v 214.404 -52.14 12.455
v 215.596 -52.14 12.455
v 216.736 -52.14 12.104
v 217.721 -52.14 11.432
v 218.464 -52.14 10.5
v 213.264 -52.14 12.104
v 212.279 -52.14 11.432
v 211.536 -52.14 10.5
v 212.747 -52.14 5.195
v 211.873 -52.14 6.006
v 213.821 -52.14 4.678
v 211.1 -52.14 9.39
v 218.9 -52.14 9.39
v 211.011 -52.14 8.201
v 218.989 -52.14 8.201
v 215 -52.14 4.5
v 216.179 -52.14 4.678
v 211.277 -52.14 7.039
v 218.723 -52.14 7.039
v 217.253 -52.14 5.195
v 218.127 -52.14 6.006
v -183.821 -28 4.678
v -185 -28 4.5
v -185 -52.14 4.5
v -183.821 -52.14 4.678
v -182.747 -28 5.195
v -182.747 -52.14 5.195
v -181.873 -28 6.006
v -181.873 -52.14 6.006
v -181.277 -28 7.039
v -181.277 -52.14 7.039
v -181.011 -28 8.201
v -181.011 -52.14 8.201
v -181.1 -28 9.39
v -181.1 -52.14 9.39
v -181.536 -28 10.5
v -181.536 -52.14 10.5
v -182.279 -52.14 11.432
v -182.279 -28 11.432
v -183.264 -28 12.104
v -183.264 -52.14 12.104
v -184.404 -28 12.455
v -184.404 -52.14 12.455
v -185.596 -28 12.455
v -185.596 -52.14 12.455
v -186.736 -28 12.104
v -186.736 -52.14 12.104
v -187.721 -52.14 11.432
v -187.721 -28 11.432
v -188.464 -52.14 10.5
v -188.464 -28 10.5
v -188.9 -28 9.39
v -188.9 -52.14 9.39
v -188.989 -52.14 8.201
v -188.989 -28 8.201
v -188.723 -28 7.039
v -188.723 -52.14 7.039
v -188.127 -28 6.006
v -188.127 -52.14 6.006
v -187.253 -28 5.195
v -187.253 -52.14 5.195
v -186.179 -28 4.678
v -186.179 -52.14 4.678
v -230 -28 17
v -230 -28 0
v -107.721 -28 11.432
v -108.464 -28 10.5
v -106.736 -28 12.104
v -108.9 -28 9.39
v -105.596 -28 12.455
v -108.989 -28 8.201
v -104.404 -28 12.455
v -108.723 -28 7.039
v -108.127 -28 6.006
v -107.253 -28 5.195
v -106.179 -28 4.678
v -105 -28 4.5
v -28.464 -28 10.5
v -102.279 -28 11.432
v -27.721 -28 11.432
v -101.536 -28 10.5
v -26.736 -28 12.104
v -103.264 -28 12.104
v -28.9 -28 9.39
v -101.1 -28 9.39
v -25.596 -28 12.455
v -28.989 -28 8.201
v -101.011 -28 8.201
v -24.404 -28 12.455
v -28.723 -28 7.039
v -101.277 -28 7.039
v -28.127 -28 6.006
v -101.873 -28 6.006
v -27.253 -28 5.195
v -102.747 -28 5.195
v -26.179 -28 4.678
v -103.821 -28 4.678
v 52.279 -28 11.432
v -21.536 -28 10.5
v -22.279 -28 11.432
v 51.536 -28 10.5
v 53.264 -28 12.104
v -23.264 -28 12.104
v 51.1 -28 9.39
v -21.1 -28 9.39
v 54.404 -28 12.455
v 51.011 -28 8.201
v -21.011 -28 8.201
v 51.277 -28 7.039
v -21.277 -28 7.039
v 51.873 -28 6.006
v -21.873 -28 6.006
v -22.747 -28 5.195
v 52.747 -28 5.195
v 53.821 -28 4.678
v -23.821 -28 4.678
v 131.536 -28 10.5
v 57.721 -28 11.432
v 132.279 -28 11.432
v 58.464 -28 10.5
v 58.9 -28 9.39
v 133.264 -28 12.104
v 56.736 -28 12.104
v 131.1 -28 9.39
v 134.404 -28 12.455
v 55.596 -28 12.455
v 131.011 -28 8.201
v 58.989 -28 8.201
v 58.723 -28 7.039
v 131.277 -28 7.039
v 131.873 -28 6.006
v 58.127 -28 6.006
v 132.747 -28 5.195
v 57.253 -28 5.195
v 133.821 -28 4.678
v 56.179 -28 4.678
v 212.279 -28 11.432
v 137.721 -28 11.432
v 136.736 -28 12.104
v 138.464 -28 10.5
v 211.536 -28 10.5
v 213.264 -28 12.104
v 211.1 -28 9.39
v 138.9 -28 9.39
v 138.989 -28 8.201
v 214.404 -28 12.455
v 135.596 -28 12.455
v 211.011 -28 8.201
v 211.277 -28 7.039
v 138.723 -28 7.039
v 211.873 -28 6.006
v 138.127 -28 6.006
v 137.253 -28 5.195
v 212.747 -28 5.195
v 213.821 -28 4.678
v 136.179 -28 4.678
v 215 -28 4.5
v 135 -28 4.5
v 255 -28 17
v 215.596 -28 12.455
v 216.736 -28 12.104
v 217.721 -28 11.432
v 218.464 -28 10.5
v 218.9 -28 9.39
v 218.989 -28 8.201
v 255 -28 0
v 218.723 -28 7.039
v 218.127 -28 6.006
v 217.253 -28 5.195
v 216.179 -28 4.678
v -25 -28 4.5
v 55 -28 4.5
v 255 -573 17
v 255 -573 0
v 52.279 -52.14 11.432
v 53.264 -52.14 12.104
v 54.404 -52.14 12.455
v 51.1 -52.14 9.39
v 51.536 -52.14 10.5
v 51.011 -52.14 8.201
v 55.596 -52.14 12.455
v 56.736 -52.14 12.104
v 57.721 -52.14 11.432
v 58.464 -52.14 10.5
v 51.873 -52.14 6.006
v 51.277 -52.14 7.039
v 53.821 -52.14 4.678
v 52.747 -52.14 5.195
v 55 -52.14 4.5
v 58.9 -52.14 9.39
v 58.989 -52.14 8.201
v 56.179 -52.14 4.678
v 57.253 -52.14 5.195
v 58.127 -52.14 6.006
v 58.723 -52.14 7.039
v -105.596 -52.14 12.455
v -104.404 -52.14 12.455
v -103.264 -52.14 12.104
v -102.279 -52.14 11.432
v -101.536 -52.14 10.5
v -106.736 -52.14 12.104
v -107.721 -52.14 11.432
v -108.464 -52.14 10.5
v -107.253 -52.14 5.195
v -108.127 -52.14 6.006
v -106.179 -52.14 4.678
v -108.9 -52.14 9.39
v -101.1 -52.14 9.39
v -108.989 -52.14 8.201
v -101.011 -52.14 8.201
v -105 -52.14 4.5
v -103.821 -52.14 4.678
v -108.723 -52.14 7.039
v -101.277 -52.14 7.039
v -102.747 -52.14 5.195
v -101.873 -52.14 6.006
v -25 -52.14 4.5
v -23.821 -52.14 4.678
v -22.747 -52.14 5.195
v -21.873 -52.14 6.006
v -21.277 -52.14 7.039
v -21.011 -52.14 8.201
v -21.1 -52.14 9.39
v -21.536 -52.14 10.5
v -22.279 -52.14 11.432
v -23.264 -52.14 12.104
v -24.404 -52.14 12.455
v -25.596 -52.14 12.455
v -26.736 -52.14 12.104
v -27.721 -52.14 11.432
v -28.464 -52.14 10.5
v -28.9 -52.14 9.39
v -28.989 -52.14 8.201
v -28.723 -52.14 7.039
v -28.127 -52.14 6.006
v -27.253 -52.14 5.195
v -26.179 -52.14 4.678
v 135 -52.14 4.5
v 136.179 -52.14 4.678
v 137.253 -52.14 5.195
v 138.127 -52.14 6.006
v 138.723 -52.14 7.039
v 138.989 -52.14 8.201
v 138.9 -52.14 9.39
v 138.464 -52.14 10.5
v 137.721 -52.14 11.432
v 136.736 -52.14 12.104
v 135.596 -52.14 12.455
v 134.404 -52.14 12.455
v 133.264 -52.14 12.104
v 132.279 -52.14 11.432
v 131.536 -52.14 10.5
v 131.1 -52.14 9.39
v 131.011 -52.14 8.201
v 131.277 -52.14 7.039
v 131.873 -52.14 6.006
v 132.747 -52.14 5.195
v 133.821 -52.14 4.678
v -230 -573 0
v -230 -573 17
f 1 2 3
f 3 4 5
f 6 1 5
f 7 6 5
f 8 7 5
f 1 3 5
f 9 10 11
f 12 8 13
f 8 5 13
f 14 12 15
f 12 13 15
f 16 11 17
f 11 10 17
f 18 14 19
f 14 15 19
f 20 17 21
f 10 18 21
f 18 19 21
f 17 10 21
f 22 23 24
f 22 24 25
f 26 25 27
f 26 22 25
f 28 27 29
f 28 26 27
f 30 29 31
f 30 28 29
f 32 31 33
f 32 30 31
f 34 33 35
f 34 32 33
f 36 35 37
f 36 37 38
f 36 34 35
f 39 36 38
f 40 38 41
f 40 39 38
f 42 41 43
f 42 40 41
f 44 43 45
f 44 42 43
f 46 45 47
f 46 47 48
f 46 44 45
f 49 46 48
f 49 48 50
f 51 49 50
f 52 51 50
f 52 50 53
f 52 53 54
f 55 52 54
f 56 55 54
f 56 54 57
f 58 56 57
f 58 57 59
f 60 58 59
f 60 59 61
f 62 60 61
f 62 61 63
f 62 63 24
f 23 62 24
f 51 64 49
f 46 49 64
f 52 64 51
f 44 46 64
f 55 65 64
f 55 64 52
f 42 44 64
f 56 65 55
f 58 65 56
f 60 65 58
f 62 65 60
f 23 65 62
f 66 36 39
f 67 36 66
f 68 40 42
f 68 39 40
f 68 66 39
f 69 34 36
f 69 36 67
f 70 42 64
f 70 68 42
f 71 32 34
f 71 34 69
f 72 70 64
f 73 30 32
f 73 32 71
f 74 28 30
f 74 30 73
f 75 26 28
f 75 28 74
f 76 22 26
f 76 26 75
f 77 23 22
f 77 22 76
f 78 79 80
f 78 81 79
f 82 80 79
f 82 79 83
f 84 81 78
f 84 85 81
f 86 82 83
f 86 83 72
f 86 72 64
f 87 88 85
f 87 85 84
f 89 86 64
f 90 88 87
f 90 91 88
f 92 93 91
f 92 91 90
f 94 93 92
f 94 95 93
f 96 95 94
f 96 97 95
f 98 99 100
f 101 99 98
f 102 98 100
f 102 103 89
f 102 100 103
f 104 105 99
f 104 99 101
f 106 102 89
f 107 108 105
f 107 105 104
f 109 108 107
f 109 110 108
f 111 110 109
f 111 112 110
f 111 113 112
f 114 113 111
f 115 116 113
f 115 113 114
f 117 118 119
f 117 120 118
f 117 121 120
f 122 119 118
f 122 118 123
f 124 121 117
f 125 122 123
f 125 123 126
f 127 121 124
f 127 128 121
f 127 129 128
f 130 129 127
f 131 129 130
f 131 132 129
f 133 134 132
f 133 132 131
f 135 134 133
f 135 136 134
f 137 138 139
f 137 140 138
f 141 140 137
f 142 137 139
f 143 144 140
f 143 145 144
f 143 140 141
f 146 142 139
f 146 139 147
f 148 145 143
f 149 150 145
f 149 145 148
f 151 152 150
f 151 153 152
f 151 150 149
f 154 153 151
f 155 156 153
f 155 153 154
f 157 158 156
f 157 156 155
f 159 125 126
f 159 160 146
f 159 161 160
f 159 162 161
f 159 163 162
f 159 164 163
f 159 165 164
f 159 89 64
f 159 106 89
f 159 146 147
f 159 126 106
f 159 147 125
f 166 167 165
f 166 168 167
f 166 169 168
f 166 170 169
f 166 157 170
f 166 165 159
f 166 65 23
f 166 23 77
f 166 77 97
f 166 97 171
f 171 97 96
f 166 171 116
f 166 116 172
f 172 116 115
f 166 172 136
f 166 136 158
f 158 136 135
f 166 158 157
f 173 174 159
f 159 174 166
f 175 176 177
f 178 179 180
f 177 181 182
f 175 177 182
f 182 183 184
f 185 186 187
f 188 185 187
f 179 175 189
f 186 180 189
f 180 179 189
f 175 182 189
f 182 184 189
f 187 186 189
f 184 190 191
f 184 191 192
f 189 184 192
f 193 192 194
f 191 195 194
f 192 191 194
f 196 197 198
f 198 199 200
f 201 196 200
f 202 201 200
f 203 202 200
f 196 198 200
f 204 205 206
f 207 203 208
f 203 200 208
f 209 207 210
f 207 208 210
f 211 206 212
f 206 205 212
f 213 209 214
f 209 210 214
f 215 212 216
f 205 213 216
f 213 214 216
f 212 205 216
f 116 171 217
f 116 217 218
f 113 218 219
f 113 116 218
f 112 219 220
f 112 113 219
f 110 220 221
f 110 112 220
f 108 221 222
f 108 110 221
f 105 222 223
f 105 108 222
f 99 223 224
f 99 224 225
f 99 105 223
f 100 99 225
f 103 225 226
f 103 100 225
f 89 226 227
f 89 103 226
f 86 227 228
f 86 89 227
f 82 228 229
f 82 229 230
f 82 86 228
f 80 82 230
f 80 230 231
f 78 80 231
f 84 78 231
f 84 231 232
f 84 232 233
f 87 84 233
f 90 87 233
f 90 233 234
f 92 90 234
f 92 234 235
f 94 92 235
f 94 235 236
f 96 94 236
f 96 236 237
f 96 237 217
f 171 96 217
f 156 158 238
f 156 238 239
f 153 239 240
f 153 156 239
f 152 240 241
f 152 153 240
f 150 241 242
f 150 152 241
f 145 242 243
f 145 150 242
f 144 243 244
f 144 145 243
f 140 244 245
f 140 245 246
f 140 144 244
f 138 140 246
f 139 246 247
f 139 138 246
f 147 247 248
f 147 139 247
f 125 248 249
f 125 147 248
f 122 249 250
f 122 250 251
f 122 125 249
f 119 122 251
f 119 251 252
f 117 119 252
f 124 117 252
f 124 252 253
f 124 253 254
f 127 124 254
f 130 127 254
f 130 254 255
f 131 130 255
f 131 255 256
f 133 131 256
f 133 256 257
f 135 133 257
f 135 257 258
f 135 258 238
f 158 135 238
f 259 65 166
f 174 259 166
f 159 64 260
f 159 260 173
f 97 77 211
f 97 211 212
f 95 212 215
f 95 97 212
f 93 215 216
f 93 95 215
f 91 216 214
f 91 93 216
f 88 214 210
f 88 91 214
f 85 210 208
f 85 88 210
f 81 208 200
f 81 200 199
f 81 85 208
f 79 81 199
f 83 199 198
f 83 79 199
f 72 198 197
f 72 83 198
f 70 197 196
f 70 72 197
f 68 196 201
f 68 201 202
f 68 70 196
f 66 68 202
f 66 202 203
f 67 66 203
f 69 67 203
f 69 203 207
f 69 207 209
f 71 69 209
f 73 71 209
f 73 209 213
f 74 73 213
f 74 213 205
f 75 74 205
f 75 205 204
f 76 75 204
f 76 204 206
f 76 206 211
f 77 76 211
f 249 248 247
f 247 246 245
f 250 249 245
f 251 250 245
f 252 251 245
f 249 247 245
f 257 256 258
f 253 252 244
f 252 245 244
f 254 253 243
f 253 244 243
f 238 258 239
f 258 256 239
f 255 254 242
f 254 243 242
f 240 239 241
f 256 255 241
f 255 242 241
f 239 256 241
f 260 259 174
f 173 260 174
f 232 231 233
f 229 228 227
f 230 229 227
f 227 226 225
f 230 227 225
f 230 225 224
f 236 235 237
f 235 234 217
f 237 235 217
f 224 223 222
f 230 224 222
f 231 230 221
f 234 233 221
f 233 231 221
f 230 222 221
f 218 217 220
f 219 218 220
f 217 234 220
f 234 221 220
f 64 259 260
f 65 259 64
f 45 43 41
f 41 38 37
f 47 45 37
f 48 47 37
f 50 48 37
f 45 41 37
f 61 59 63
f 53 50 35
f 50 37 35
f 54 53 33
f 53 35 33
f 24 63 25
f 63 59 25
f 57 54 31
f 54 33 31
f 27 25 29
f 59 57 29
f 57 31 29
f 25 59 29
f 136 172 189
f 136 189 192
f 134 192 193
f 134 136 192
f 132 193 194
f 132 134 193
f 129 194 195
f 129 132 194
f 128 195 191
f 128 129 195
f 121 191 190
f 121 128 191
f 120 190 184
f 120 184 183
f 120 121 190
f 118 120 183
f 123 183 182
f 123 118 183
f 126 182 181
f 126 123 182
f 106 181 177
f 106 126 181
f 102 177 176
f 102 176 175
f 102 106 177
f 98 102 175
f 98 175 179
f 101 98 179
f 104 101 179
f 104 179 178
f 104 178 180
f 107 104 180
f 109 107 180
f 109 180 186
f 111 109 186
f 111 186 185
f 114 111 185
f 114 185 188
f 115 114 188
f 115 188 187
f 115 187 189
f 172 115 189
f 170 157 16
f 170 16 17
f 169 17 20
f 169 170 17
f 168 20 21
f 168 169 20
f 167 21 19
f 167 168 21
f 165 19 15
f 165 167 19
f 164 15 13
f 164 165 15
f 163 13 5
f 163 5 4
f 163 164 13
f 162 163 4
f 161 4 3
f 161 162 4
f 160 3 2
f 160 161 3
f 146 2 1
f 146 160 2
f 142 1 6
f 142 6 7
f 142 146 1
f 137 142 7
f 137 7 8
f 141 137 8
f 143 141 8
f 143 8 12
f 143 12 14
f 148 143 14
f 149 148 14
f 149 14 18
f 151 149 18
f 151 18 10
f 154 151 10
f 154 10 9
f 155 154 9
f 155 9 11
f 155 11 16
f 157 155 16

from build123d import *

# Parameters (mm, degrees)
SKETCH1_W               = 485
SKETCH1_H               = 545
BOSS_EXTRUDE1_DEPTH     = 17
CUT_EXTRUDE3_DEPTH      = 25
CUT_EXTRUDE3_DEPTH_BACK = 13
SKETCH4_R               = 4


with BuildPart() as part:
    # Sketch1 → Boss-Extrude1 (new body)
    with BuildSketch(Plane.XY):
        with Locations((12.5, -300.5)):
            Rectangle(SKETCH1_W, SKETCH1_H)
    extrude(amount=BOSS_EXTRUDE1_DEPTH)

    # Sketch4 → Cut-Extrude3 (cut, two sides: drawn at the far end of the back side and taken through both)
    with BuildSketch(Plane(origin=(5, -27.139504096, 249), x_dir=(0, 0, 1), z_dir=(0, -1, 0)).offset(-CUT_EXTRUDE3_DEPTH_BACK)):
        with Locations(Location((-240.5, -210, 0), (0, 0, 180))):
            Circle(SKETCH4_R)
        with Locations(Location((-240.5, -130, 0), (0, 0, 180))):
            Circle(SKETCH4_R)
        with Locations(Location((-240.5, -50, 0), (0, 0, 180))):
            Circle(SKETCH4_R)
        with Locations(Location((-240.5, 30, 0), (0, 0, 180))):
            Circle(SKETCH4_R)
        with Locations(Location((-240.5, 110, 0), (0, 0, 180))):
            Circle(SKETCH4_R)
        with Locations(Location((-240.5, 190, 0), (0, 0, 180))):
            Circle(SKETCH4_R)
    extrude(amount=CUT_EXTRUDE3_DEPTH + CUT_EXTRUDE3_DEPTH_BACK, mode=Mode.SUBTRACT)


solid = part.part
